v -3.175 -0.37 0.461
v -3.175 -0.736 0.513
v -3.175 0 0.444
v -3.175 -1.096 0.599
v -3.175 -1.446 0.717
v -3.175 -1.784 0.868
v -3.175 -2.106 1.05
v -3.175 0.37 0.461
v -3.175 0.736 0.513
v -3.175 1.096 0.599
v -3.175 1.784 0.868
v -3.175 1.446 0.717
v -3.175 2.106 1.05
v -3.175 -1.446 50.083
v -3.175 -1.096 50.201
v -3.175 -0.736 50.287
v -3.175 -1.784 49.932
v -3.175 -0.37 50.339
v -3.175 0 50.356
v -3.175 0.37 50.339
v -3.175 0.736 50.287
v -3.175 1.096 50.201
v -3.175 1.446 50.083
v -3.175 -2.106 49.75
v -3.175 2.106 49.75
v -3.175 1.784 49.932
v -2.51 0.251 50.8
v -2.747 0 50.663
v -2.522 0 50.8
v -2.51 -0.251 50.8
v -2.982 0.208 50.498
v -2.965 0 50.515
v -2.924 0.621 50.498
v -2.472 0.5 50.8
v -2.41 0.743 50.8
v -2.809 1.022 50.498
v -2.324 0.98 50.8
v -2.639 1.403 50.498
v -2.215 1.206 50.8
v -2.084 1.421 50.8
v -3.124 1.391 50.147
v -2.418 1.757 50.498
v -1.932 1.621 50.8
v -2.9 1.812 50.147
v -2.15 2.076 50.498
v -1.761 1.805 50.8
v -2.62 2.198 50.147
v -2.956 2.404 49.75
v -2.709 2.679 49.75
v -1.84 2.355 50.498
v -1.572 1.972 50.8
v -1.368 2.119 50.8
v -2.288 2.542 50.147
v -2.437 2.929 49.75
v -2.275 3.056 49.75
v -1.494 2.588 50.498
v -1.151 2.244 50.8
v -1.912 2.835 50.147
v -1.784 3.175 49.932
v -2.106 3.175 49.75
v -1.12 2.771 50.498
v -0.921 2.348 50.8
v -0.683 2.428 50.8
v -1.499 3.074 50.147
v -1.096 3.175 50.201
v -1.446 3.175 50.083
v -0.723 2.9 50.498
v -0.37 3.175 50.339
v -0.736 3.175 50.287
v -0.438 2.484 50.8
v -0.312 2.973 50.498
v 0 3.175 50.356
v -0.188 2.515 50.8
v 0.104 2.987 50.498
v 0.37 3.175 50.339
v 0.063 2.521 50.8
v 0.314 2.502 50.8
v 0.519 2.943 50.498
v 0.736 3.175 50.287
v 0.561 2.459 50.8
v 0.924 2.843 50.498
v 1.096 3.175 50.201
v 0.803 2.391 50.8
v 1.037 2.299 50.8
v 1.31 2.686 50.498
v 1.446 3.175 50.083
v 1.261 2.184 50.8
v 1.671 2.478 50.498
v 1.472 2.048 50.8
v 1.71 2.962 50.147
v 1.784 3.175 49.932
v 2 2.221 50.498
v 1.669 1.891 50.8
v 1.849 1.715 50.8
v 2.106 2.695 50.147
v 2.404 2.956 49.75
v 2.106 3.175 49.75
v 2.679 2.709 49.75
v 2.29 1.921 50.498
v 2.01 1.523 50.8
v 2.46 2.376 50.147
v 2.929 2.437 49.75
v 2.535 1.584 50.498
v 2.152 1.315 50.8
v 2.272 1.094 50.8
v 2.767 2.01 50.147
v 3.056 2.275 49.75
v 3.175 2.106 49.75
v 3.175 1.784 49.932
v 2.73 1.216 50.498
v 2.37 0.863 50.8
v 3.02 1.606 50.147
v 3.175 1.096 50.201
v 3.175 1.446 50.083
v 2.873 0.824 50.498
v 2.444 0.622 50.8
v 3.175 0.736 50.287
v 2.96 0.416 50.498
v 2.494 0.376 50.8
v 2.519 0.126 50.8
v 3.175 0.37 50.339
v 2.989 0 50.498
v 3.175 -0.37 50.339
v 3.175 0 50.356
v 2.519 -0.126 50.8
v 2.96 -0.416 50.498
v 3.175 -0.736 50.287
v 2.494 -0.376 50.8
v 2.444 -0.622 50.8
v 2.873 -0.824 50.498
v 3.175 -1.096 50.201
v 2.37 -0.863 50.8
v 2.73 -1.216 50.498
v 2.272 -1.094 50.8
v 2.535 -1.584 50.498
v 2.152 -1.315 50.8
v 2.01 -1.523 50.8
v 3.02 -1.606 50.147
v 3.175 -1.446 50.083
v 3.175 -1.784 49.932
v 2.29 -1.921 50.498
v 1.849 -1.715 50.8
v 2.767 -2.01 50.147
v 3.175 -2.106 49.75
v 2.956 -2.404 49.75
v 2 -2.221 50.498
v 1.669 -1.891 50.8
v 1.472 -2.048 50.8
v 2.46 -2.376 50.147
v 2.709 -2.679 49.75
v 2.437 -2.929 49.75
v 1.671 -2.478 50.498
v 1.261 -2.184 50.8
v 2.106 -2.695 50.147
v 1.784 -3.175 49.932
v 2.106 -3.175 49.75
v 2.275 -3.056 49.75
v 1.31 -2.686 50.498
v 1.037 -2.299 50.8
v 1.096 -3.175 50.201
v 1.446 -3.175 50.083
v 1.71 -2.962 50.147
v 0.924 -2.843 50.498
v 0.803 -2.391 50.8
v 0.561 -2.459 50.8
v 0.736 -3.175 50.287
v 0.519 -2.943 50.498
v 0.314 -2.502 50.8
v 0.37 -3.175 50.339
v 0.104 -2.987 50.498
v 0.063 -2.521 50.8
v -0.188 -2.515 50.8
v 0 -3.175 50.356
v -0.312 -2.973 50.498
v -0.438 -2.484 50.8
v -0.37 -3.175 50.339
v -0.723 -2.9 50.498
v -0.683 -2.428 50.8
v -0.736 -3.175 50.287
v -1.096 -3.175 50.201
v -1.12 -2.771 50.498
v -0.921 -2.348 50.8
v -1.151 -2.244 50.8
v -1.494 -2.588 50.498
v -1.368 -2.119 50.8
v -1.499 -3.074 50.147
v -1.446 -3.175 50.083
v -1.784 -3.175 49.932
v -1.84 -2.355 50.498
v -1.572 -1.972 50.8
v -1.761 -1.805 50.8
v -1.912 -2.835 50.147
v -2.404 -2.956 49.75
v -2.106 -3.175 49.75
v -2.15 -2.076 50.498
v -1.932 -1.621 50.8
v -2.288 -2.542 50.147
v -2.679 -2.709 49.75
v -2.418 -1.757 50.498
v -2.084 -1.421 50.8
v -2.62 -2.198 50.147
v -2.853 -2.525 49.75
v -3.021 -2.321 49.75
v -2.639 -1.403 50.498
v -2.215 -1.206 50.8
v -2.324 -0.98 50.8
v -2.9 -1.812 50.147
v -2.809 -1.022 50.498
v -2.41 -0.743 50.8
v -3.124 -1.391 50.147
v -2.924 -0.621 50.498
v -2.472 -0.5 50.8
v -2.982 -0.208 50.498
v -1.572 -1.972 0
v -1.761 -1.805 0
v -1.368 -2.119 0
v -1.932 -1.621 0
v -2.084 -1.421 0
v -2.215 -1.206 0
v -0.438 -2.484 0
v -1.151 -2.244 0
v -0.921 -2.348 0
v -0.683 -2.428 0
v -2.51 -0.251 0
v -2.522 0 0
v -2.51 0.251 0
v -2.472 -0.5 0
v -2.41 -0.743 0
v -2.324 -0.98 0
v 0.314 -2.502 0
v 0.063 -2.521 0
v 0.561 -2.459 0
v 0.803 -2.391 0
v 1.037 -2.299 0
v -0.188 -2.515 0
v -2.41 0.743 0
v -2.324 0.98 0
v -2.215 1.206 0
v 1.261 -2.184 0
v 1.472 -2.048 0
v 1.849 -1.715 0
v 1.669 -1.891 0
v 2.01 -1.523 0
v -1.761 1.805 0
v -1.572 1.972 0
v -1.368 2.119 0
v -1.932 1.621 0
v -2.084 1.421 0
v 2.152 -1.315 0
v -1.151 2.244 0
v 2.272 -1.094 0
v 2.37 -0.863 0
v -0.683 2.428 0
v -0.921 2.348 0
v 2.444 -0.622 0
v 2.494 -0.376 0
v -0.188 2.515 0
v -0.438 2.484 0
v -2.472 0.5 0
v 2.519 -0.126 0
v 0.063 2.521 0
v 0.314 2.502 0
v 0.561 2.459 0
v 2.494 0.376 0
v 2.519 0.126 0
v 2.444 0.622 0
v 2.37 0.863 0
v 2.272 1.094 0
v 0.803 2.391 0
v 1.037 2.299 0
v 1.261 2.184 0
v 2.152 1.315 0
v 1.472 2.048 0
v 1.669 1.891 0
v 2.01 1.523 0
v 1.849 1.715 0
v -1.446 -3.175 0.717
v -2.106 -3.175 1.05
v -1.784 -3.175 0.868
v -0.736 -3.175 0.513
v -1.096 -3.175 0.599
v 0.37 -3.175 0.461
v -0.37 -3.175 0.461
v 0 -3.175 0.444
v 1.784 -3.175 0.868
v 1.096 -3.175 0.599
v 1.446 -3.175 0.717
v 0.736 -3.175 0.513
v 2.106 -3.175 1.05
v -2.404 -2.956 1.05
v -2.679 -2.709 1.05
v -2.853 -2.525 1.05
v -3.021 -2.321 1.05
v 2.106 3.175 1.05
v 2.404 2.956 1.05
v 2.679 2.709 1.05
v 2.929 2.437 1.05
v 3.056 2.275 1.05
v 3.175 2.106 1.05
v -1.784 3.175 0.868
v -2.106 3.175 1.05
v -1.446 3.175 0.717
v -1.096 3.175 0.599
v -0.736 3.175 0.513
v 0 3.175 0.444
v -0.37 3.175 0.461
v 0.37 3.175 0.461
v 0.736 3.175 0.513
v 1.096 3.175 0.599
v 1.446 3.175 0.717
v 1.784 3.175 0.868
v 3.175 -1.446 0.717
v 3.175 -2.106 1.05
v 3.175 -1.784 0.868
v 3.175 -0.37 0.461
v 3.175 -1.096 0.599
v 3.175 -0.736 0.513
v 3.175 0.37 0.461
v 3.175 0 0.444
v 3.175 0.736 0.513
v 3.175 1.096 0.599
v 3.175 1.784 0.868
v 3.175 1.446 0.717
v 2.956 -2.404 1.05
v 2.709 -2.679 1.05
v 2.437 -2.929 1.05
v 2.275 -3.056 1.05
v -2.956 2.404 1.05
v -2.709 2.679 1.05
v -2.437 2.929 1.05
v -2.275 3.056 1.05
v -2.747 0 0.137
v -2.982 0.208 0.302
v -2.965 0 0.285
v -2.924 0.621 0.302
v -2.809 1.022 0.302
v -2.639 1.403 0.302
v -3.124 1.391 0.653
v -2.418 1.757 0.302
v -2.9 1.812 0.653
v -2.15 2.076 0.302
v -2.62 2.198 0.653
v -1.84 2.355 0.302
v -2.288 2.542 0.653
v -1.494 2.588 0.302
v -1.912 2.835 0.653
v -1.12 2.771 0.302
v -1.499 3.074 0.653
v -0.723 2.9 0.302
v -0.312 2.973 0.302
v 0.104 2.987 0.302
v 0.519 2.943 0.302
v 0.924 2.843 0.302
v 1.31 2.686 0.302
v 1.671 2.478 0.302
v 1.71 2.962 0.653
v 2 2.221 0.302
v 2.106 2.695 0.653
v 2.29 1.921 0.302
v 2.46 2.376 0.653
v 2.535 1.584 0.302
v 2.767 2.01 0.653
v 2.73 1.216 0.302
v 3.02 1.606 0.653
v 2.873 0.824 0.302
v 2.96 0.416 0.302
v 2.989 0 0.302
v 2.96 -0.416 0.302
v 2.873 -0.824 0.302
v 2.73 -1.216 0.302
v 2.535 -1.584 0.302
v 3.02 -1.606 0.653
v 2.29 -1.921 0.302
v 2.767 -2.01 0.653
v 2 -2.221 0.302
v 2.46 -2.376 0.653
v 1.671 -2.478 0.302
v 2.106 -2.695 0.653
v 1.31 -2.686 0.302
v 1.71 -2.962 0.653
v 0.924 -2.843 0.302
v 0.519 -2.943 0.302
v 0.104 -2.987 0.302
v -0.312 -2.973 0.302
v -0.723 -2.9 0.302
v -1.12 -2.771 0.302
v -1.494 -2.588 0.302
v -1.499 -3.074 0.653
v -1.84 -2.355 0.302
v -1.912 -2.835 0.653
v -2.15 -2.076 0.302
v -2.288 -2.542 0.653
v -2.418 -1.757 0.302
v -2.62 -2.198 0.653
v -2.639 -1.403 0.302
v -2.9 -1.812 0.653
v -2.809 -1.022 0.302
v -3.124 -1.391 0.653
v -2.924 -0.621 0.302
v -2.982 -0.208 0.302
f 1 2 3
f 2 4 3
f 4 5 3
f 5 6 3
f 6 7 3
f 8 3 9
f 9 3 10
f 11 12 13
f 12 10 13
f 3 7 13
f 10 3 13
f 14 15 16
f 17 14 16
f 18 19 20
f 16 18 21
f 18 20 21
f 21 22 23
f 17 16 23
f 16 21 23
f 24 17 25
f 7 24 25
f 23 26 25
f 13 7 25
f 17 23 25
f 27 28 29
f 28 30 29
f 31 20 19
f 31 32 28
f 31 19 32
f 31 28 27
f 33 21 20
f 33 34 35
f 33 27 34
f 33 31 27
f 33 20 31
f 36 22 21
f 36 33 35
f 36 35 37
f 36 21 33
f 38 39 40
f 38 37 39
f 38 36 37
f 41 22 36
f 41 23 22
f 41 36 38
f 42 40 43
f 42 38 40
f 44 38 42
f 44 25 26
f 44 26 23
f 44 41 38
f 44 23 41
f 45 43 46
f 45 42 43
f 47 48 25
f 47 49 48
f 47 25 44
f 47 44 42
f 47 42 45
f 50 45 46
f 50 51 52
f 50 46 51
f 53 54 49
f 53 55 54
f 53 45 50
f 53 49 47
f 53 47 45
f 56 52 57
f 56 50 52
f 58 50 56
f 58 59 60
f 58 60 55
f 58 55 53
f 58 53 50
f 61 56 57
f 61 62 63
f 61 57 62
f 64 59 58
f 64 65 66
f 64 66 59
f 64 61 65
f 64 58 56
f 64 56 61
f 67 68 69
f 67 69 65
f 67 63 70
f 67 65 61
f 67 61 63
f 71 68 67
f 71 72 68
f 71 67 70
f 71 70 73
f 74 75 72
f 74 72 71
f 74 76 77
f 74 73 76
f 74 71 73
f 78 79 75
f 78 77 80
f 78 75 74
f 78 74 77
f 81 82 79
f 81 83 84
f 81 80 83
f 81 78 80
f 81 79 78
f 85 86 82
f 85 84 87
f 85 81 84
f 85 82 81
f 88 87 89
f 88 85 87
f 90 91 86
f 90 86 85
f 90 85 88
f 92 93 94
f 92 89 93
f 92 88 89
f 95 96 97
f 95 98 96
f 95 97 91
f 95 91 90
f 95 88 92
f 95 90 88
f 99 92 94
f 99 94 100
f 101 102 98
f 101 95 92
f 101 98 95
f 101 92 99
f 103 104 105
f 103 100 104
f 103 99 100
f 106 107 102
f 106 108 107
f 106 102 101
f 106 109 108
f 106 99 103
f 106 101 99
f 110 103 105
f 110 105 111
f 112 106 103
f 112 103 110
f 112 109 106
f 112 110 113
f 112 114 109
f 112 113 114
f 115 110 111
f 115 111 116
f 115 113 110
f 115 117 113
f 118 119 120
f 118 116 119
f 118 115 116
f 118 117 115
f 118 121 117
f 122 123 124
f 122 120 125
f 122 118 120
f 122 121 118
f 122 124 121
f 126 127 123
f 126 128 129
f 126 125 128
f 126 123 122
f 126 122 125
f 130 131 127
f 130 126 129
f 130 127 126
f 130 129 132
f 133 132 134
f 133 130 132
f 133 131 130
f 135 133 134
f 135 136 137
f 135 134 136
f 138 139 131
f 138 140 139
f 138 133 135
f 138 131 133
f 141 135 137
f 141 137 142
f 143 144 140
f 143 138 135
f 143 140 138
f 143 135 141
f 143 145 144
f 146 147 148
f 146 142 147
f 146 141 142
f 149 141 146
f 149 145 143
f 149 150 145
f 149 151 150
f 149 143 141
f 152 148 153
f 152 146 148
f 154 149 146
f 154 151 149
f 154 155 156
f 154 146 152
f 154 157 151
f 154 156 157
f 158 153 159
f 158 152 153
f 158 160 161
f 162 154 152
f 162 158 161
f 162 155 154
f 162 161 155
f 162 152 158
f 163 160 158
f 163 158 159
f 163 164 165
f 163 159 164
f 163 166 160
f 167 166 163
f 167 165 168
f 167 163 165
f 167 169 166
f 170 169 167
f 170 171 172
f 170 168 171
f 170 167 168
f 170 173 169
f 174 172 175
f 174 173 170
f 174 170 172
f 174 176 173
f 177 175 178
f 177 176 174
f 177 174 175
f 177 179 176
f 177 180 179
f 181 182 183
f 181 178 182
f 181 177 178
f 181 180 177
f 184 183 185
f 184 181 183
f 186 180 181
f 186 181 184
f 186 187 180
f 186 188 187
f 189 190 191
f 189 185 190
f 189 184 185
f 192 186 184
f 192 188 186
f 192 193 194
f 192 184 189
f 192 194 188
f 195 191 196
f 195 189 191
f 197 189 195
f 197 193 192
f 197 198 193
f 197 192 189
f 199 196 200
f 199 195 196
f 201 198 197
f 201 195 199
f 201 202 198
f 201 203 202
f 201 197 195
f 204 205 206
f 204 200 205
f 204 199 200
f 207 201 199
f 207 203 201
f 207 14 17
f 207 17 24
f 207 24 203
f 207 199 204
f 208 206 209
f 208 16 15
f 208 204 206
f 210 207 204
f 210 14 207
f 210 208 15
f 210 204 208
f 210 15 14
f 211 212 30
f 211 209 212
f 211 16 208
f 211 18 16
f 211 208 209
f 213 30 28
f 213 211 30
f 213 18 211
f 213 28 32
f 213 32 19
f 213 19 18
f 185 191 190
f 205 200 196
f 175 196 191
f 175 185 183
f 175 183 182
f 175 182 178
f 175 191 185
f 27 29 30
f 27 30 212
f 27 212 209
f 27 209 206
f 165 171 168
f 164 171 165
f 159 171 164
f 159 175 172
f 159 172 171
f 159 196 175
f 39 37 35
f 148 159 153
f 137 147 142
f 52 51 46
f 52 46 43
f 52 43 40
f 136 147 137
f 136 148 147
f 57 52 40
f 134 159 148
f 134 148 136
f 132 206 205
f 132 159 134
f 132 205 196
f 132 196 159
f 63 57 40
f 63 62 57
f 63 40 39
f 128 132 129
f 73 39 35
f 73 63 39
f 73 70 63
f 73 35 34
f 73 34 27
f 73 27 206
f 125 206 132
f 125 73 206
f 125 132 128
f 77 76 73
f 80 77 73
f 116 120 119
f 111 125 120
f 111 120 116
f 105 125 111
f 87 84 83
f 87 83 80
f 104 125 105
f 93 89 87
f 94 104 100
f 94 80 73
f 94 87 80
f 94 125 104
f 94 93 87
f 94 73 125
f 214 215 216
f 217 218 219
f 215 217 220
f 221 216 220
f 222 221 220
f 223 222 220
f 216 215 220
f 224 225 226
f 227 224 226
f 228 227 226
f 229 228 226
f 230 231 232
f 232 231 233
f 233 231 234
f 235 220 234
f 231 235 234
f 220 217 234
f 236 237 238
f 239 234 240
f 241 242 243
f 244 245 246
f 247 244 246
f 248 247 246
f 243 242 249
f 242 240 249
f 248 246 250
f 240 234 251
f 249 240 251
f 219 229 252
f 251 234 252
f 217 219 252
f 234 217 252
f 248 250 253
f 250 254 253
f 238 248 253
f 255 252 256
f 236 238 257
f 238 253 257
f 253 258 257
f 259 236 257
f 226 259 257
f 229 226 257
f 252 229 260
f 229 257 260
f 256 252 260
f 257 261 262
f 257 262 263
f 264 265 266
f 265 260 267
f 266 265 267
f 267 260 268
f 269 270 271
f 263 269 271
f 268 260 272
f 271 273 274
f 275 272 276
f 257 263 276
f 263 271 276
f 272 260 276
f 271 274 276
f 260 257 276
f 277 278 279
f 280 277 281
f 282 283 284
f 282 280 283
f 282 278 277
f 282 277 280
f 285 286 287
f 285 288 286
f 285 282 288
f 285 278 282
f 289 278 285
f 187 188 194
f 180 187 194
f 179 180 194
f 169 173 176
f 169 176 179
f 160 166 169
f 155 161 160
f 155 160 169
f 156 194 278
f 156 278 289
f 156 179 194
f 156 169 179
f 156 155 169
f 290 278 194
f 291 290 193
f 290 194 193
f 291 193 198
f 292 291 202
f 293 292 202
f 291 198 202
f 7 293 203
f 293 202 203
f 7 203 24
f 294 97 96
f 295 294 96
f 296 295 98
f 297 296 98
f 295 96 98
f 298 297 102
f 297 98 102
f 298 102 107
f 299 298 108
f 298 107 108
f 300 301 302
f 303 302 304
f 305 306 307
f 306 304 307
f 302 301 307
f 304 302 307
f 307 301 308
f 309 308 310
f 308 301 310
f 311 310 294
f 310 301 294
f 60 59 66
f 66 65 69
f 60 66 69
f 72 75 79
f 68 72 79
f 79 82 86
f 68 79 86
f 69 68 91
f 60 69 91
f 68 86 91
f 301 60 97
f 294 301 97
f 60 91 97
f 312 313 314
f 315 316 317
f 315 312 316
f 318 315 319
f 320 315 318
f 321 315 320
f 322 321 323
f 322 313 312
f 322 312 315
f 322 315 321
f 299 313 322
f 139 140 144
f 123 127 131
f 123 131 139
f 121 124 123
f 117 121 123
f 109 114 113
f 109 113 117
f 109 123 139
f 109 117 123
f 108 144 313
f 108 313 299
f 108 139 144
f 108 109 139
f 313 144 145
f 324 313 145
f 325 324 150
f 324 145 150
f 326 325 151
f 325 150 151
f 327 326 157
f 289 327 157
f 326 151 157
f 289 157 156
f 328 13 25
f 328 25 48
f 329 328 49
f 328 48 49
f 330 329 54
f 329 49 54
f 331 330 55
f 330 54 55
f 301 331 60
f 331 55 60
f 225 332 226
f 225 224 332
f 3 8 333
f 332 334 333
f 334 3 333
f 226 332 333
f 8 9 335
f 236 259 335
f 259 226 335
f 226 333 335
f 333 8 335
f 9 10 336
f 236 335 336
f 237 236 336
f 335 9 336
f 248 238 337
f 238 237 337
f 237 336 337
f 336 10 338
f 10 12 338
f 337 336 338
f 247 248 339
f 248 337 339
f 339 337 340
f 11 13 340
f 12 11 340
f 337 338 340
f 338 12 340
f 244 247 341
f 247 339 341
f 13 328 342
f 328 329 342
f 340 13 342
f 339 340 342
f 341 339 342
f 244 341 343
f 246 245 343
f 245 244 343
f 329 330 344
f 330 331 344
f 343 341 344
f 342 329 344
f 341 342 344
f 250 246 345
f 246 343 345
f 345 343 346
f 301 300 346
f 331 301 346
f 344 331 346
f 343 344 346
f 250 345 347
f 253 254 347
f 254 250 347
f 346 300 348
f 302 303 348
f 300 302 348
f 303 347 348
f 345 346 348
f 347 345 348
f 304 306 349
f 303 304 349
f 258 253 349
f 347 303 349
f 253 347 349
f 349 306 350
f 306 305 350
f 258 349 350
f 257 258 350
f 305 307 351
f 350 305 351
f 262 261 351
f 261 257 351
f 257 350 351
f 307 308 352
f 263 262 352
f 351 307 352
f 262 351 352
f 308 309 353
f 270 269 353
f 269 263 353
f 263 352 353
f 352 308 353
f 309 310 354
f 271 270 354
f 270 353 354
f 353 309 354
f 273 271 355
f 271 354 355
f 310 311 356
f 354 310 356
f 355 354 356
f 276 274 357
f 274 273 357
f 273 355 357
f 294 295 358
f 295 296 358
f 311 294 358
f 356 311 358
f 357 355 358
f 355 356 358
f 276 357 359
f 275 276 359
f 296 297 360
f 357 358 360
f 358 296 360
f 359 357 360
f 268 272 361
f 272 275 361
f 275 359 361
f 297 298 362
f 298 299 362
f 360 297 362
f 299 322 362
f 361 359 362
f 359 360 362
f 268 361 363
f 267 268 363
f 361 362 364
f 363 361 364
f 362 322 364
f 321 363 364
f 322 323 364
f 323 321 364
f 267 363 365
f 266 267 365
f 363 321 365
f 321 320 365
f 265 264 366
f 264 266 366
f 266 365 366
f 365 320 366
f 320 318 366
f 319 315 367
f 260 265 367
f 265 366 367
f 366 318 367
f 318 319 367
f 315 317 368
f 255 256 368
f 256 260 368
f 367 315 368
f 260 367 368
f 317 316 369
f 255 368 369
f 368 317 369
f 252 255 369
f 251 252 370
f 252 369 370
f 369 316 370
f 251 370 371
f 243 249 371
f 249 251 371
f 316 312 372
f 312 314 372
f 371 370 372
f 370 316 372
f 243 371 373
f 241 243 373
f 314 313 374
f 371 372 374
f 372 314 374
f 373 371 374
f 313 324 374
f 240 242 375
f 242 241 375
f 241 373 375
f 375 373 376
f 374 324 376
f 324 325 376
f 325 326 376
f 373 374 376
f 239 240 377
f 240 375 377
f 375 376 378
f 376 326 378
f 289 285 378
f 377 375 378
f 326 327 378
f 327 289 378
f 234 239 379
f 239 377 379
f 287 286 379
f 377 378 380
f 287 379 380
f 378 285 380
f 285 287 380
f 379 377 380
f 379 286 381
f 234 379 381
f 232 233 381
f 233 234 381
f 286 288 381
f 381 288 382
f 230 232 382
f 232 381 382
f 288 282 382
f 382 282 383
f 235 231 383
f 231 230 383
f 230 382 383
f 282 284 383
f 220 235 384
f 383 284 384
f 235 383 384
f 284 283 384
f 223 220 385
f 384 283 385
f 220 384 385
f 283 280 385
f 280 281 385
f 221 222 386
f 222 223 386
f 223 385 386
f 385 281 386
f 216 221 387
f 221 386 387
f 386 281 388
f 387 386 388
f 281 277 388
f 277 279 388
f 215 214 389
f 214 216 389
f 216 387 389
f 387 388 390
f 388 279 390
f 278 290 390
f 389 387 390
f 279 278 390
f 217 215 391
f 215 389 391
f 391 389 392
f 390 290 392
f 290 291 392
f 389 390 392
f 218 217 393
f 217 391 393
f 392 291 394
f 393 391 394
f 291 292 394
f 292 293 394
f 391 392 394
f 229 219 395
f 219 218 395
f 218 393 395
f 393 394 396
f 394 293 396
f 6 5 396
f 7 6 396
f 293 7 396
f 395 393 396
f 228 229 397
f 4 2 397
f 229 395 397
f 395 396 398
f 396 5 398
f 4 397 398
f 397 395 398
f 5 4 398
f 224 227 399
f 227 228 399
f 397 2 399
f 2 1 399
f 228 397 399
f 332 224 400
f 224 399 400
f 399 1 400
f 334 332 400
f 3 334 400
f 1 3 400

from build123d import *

# Parameters (mm, degrees)
SKETCH1_W           = 6.35
SKETCH1_H           = 6.35
BOSS_EXTRUDE1_DEPTH = 25.4
SKETCH2_OUTSIDE_W   = 13.738
SKETCH2_OUTSIDE_H   = 13.738
SKETCH2_OUTSIDE_R   = 3.81
CUT_EXTRUDE1_DEPTH  = 26.4


with BuildPart() as part:
    # Sketch1 → Boss-Extrude1 (new body)
    with BuildSketch(Plane.XY):
        Rectangle(SKETCH1_W, SKETCH1_H)
    extrude(amount=BOSS_EXTRUDE1_DEPTH)

    # Sketch2 outside → Cut-Extrude1 (cut, through all)
    with BuildSketch(Plane(origin=(0, 0, 0), x_dir=(-1, 0, 0), z_dir=(0, 0, -1))):
        Rectangle(SKETCH2_OUTSIDE_W, SKETCH2_OUTSIDE_H)
        Circle(SKETCH2_OUTSIDE_R, mode=Mode.SUBTRACT)
    extrude(amount=-CUT_EXTRUDE1_DEPTH, mode=Mode.SUBTRACT)

    # Sketch3 → Cut-Revolve1 (revolve, cut)
    with BuildSketch(Plane(origin=(0, 0, 0), x_dir=(1, 0, 0), z_dir=(0, 1, 0))):
        with BuildLine():
            Line((-5.053685963, -3.893335876), (-5.053685963, 5.740530545))
            Line((-5.053685963, 5.740530545), (0, 5.740530545))
            Line((0, 5.740530545), (0, 0.670274551))
            ThreePointArc((0, 0.670274551), (-3.404639553, -0.639469554), (-5.053685963, -3.893335876))
        make_face()
    revolve(axis=Axis((0, 0, 25.4), (0, 0, -1)), mode=Mode.SUBTRACT)

    # Mirror1: part across plane


with BuildPart() as part_1:
    add(part.part)
    add(part.part.mirror(Plane(origin=(0, 0, 25.4), x_dir=(1, 0, 0), z_dir=(0, 0, -1))))


solid = part_1.part
